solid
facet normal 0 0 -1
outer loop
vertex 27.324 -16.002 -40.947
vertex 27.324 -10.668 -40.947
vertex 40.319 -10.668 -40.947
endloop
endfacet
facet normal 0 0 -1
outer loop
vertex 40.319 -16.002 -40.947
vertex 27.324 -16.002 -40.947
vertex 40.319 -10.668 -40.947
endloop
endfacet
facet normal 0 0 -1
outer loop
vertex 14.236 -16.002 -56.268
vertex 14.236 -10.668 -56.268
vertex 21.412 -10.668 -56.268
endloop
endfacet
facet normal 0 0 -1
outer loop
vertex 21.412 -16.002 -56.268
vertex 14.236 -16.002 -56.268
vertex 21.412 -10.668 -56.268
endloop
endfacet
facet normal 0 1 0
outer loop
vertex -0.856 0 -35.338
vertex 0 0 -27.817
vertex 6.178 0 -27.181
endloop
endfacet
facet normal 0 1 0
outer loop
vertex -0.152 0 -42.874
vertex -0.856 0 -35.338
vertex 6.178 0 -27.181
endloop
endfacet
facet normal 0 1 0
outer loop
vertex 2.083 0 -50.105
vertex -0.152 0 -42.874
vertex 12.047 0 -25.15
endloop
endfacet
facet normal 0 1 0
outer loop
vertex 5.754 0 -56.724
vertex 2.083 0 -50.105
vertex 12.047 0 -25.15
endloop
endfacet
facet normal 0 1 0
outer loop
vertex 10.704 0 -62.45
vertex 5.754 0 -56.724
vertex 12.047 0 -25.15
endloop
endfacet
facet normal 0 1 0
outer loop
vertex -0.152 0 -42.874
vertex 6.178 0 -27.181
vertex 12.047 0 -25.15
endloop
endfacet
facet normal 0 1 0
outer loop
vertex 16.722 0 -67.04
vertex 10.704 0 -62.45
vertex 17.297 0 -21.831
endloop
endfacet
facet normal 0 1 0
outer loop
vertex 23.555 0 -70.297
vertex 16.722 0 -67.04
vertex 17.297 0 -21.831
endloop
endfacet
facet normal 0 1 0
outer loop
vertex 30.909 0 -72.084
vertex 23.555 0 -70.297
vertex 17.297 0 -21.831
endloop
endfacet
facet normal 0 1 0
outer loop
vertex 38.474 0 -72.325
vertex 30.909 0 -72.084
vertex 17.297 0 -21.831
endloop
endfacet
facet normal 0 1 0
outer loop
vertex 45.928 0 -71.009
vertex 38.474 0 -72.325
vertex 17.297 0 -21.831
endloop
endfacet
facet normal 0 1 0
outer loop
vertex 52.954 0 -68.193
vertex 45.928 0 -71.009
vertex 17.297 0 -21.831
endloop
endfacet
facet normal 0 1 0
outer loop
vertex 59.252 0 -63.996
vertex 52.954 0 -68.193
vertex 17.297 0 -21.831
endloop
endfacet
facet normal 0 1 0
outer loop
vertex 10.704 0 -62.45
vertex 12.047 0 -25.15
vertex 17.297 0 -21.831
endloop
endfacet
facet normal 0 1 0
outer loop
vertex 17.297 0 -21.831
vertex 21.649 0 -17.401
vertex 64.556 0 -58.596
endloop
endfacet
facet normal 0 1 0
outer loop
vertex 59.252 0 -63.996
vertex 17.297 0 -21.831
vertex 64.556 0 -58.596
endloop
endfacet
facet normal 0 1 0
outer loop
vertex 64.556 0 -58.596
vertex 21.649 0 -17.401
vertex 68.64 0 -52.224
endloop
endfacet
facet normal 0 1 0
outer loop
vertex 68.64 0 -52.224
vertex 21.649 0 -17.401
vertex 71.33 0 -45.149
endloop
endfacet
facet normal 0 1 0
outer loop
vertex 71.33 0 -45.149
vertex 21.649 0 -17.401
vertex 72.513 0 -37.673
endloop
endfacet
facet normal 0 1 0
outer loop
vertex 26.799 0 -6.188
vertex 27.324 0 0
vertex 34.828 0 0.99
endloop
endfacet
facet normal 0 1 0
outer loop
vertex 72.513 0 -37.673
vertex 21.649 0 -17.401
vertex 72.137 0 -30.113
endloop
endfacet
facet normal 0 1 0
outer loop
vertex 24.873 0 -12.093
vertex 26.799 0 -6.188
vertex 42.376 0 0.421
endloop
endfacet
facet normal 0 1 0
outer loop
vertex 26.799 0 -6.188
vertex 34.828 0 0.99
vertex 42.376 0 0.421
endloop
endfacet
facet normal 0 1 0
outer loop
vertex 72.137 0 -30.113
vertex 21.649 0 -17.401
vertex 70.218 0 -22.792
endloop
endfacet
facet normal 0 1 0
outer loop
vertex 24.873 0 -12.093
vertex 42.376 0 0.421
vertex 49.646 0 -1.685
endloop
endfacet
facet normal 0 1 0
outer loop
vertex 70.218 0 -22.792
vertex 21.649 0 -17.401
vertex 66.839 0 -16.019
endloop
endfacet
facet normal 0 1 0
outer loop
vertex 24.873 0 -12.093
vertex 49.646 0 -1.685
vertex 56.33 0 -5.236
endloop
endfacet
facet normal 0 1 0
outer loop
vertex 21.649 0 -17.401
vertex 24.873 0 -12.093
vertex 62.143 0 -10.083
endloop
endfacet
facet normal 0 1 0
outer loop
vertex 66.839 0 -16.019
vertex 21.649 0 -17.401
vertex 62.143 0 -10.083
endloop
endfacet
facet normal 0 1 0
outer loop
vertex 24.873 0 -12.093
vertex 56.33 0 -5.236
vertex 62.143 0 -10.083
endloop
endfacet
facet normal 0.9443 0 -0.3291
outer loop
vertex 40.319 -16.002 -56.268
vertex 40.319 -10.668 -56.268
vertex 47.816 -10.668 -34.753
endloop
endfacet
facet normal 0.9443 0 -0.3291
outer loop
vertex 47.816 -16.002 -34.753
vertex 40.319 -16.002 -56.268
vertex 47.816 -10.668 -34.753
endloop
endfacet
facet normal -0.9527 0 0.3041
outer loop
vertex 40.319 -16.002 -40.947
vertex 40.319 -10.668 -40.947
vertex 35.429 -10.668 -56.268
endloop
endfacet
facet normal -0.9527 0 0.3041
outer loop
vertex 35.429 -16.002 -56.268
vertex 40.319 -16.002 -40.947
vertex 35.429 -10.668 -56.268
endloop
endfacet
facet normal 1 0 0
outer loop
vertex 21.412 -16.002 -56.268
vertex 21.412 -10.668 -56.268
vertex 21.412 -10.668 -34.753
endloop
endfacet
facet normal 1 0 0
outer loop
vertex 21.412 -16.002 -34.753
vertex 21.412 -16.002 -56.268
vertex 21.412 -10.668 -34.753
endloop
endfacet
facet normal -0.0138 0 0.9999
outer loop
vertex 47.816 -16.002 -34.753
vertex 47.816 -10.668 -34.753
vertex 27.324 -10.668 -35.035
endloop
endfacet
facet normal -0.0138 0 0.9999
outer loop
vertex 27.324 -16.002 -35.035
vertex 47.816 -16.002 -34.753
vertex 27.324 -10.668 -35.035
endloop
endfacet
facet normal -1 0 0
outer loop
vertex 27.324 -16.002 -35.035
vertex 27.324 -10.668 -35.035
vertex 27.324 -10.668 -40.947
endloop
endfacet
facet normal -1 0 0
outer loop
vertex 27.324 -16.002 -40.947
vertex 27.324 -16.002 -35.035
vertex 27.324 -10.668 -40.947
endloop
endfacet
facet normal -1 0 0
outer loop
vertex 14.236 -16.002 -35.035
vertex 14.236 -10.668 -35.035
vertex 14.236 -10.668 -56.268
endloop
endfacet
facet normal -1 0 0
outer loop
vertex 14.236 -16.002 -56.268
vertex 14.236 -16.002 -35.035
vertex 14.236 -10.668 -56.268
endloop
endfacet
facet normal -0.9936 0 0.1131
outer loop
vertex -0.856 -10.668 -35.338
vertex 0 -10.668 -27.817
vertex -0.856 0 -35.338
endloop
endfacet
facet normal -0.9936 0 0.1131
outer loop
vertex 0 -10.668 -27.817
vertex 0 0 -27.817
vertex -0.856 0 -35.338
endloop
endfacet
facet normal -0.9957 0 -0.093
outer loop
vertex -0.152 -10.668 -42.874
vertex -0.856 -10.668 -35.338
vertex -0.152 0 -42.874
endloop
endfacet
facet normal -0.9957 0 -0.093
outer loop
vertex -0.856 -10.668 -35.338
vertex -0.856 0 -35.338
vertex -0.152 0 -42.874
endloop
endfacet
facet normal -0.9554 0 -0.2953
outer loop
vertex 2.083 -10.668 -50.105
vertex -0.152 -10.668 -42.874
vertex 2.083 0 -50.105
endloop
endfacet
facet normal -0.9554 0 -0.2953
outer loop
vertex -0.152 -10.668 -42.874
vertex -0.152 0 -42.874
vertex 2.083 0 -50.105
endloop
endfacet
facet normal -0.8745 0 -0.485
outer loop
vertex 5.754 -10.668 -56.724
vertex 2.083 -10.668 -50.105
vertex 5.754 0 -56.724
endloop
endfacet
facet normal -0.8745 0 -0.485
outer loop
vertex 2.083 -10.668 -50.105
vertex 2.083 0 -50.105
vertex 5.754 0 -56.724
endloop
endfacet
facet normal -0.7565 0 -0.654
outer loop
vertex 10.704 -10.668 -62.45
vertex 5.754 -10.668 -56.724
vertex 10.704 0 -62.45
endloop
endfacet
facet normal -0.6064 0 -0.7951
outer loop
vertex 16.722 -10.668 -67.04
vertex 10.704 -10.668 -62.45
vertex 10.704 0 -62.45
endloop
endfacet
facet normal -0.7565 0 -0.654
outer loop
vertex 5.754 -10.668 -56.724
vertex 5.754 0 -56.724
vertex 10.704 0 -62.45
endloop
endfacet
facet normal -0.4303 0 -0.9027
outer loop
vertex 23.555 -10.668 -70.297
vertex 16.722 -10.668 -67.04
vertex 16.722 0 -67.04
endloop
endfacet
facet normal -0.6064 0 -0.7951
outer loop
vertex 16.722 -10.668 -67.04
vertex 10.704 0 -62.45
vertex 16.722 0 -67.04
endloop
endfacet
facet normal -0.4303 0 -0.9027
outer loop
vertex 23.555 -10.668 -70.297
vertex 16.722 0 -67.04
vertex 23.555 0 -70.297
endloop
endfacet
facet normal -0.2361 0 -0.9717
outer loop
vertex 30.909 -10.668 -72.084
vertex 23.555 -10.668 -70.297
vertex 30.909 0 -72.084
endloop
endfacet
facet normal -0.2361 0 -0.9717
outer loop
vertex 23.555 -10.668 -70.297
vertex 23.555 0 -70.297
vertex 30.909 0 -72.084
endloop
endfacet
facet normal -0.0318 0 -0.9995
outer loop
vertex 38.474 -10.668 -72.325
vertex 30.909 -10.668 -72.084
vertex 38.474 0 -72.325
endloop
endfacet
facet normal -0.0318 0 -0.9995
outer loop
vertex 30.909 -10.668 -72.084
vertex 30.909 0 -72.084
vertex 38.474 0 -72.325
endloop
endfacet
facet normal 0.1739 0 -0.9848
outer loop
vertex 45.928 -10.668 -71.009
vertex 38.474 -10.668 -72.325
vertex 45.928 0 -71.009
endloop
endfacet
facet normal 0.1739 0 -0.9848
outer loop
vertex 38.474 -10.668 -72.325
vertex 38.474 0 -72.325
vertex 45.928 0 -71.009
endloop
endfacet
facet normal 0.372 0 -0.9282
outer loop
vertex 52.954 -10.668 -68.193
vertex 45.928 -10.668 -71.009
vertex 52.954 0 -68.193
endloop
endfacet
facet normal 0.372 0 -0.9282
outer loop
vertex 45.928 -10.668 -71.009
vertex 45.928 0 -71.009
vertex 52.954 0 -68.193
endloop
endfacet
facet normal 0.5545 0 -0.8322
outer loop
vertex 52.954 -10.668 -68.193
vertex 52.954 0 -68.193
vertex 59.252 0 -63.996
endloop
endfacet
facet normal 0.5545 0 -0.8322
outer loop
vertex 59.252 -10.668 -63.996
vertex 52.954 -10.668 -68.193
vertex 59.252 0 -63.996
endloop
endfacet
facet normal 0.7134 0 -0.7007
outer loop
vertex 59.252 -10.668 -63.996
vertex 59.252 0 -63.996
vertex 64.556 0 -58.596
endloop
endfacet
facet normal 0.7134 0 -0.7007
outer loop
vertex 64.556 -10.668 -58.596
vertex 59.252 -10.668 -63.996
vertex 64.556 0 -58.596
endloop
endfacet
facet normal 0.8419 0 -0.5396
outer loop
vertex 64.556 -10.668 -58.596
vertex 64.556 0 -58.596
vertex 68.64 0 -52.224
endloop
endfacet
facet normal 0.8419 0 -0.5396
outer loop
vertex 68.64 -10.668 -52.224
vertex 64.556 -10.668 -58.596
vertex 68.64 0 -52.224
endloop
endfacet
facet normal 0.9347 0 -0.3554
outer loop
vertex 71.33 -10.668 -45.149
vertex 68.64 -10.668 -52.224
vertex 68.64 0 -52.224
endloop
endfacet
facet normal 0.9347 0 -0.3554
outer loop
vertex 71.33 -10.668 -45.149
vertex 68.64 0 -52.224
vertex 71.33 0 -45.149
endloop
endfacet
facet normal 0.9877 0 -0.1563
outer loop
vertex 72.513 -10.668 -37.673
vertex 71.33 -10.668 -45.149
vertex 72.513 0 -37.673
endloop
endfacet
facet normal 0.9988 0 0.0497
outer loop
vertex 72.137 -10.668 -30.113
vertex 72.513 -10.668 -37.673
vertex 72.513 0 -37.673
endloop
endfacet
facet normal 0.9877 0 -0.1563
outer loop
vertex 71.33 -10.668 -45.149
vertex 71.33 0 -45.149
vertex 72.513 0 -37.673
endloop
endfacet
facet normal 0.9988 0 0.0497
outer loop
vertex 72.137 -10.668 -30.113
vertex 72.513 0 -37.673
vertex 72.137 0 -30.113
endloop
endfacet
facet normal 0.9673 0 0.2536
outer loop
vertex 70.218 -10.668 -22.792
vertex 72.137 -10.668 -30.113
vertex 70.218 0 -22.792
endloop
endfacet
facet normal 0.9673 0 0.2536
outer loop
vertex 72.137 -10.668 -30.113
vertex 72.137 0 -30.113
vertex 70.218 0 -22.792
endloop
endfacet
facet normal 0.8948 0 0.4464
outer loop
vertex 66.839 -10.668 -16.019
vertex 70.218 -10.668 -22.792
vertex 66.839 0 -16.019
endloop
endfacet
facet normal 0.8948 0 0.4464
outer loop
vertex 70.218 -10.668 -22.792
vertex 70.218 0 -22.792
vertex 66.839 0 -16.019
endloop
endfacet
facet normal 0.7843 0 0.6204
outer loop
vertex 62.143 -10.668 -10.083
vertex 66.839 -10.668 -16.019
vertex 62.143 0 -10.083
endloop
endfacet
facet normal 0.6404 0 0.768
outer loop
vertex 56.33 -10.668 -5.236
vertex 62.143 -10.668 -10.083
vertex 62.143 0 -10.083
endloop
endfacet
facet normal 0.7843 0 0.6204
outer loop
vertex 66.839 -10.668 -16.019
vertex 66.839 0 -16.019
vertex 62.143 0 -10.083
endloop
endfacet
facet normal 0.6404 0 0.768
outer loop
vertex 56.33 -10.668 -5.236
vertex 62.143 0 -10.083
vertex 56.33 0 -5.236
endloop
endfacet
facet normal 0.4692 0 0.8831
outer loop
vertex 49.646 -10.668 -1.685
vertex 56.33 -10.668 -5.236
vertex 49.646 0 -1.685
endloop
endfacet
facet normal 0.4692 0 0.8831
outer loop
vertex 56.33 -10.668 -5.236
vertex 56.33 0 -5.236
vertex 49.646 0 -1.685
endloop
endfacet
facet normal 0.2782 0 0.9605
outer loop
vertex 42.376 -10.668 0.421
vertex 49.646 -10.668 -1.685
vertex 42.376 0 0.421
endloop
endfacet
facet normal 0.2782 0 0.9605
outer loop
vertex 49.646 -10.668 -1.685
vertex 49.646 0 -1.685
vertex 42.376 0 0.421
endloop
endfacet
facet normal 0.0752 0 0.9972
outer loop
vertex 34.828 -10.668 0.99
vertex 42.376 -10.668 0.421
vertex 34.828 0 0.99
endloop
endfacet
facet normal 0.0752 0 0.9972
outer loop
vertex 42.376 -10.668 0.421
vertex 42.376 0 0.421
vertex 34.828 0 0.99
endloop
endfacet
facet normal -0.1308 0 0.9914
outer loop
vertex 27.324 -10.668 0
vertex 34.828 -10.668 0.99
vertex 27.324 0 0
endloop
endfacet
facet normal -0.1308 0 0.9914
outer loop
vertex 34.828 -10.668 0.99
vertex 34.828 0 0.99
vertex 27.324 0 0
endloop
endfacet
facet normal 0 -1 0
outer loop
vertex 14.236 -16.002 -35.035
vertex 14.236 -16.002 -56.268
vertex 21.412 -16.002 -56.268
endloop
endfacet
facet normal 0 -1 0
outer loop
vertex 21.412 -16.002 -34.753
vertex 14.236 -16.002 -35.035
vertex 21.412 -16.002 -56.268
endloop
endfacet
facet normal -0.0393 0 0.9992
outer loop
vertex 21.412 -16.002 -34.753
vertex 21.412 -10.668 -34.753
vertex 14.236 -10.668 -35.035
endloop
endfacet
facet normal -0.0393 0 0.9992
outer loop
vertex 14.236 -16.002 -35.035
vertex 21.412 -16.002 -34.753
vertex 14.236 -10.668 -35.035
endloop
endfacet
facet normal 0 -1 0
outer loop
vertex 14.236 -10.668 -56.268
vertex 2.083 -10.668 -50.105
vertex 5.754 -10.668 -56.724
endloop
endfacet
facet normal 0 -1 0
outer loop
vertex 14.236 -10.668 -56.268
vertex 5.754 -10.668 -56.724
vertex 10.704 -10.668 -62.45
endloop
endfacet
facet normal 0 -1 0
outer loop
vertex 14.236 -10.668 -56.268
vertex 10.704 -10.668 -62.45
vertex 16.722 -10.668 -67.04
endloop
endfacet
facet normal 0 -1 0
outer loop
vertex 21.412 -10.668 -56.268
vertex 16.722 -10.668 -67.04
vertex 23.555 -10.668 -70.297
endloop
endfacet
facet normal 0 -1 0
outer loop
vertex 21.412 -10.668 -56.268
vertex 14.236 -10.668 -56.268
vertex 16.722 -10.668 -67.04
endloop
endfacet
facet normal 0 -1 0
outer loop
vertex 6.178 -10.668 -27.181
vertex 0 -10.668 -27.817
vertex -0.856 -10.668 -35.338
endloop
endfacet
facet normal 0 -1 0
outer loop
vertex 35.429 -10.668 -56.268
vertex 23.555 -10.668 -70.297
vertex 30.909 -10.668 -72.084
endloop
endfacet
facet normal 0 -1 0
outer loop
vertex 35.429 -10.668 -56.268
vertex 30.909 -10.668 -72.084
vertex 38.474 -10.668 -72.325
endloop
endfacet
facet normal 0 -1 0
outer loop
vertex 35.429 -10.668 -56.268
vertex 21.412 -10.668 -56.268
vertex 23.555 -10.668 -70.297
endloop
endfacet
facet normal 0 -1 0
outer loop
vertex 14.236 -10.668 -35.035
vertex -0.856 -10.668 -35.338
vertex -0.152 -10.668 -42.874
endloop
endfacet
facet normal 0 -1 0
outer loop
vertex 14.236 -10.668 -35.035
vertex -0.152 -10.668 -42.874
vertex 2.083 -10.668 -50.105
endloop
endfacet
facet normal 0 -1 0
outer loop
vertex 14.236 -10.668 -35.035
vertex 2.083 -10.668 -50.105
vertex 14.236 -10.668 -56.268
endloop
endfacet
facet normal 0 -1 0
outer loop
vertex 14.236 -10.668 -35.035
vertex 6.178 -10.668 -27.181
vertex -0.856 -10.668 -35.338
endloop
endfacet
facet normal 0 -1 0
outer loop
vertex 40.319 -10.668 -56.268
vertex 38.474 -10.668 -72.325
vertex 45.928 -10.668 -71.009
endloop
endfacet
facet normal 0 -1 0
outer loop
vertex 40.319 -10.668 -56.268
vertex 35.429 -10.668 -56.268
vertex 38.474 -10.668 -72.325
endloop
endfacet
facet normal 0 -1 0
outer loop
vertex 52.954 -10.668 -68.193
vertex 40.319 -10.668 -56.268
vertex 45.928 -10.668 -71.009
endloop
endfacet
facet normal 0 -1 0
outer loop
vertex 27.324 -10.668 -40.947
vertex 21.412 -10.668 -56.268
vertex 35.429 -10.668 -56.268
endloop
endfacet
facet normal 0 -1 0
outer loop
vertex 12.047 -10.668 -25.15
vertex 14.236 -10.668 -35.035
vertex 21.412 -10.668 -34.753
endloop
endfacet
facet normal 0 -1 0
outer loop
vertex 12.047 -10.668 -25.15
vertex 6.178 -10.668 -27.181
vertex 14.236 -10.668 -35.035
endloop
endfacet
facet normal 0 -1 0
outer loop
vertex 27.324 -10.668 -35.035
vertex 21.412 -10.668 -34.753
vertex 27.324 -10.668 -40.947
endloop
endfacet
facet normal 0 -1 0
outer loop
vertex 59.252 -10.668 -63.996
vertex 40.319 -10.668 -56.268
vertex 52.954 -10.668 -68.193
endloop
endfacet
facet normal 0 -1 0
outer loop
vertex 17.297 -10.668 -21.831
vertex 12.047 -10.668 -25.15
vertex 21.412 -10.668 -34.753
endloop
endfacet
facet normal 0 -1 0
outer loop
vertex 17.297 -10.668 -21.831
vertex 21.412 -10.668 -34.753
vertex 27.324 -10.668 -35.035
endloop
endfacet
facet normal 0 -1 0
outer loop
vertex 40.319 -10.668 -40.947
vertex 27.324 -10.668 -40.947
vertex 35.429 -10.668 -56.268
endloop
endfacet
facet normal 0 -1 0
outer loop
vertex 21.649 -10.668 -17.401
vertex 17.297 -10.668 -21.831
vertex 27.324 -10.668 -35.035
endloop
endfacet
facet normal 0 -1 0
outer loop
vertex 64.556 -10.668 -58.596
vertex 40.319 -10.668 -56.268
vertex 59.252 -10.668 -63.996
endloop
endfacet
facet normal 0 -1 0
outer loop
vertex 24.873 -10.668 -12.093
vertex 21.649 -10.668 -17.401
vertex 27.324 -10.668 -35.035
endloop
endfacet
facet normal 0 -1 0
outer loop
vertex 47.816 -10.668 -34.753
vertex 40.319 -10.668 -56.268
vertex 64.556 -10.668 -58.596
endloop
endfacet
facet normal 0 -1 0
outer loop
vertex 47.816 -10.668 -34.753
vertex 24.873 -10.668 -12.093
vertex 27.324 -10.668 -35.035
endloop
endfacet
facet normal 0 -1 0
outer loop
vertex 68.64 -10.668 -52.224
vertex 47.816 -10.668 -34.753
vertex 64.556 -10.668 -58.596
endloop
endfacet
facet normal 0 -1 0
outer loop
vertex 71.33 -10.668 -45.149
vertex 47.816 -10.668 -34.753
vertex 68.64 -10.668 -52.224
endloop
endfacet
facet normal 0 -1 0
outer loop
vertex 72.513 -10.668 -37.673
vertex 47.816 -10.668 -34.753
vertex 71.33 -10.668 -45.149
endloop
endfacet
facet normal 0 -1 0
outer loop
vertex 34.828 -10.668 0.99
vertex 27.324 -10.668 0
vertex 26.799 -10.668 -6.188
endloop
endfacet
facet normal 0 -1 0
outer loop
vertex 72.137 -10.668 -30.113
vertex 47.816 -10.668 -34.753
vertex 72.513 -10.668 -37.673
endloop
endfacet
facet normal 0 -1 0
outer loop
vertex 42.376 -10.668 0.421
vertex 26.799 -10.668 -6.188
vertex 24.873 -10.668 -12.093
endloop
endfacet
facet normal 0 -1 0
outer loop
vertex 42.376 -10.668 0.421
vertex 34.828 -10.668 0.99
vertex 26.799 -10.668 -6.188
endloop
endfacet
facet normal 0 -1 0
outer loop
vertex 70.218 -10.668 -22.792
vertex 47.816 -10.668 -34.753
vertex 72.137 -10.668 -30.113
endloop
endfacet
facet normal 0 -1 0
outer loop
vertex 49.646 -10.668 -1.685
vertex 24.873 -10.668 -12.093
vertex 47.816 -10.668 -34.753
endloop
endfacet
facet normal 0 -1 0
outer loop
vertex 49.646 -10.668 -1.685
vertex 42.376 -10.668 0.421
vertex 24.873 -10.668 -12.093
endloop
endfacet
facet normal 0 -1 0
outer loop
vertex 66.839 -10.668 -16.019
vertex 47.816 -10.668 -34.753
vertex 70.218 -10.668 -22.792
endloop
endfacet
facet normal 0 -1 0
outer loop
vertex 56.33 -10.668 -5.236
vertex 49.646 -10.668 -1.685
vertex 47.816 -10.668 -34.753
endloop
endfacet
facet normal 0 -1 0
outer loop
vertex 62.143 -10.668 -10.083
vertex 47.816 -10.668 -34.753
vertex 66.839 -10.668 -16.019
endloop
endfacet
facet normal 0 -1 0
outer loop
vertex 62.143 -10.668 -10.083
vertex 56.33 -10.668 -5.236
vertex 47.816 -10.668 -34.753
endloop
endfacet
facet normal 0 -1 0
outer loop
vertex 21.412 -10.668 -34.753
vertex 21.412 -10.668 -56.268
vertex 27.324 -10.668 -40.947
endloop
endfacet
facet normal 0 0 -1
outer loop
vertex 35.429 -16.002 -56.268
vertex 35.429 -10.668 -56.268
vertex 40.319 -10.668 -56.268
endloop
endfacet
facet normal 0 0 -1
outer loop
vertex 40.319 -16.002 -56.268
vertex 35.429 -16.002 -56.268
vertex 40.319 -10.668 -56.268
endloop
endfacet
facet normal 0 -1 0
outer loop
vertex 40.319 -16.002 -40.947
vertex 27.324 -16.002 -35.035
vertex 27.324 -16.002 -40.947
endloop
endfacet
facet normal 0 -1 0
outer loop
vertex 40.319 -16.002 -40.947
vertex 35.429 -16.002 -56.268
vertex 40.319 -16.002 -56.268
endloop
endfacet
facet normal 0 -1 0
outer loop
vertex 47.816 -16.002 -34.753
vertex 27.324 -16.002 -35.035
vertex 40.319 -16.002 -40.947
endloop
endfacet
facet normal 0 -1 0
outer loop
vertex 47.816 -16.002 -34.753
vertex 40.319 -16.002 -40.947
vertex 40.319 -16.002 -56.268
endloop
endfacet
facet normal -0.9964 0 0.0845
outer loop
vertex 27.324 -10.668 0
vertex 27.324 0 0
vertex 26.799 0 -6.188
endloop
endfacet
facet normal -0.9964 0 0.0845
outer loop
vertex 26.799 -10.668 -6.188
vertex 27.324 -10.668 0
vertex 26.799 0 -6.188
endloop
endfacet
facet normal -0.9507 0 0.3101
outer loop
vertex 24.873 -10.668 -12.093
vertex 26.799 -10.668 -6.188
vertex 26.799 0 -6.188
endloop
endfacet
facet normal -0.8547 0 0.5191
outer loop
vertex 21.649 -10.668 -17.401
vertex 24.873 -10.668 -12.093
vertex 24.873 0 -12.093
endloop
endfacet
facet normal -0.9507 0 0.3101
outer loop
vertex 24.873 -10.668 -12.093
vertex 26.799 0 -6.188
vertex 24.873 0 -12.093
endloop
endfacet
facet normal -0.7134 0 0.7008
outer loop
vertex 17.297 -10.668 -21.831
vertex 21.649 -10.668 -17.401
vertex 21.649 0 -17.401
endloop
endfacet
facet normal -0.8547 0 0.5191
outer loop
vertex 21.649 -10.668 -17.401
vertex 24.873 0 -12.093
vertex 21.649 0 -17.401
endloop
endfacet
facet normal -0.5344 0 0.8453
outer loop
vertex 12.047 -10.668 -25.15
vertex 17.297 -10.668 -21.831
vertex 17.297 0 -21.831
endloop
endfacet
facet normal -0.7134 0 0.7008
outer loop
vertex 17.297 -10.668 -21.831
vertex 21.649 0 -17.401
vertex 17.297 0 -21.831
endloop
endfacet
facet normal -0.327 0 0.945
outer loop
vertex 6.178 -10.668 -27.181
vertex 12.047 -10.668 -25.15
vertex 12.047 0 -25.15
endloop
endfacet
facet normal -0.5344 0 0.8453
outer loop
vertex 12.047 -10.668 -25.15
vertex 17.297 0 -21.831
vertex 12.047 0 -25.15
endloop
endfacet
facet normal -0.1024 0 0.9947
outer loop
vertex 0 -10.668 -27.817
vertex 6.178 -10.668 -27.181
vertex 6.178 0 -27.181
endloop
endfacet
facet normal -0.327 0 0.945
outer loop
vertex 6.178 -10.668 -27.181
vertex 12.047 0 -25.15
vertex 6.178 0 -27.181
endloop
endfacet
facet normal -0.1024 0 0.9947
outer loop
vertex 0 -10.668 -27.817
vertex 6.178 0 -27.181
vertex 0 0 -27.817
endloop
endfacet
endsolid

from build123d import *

# Parameters (mm, degrees)
F1_DEPTH = 5.334
F2_DEPTH = 5.334
F4_DEPTH = 5.334


with BuildPart() as f1:
    # F0 (on Front) → F1 (new body)
    with BuildSketch(Plane.XZ):
        with BuildLine():
            ThreePointArc((27.324475, 0), (19.600425, -19.741603), (0, -27.817197))
            ThreePointArc((0, -27.817197), (62.043611, -61.433), (27.324475, 0))
        make_face()
    extrude(amount=F1_DEPTH)

    # F1_face (on face) → F2 (join)
    with BuildSketch(Plane(origin=(37.914112, -5.334, -37.730903), x_dir=(1, 0, 0), z_dir=(0, -1, 0))):
        with BuildLine():
            ThreePointArc((-10.589637, 37.730903), (-18.313687, 17.9893), (-37.914112, 9.913706))
            ThreePointArc((-37.914112, 9.913706), (24.129499, -23.702097), (-10.589637, 37.730903))
        make_face()
    extrude(amount=F2_DEPTH)

    # F3 (on face) → F4 (join)
    with BuildSketch(Plane.XZ.offset(10.668)):
        Polygon((47.816351, -34.752887), (27.324475, -35.03488), (27.324475, -40.946536), (40.31878, -40.946536), (35.429053, -56.267668), (40.31878, -56.267668), align=None)
        Polygon((21.411845, -34.752887), (14.236325, -35.03488), (14.236325, -56.267668), (21.411845, -56.267668), align=None)
    extrude(amount=F4_DEPTH)


solid = f1.part
